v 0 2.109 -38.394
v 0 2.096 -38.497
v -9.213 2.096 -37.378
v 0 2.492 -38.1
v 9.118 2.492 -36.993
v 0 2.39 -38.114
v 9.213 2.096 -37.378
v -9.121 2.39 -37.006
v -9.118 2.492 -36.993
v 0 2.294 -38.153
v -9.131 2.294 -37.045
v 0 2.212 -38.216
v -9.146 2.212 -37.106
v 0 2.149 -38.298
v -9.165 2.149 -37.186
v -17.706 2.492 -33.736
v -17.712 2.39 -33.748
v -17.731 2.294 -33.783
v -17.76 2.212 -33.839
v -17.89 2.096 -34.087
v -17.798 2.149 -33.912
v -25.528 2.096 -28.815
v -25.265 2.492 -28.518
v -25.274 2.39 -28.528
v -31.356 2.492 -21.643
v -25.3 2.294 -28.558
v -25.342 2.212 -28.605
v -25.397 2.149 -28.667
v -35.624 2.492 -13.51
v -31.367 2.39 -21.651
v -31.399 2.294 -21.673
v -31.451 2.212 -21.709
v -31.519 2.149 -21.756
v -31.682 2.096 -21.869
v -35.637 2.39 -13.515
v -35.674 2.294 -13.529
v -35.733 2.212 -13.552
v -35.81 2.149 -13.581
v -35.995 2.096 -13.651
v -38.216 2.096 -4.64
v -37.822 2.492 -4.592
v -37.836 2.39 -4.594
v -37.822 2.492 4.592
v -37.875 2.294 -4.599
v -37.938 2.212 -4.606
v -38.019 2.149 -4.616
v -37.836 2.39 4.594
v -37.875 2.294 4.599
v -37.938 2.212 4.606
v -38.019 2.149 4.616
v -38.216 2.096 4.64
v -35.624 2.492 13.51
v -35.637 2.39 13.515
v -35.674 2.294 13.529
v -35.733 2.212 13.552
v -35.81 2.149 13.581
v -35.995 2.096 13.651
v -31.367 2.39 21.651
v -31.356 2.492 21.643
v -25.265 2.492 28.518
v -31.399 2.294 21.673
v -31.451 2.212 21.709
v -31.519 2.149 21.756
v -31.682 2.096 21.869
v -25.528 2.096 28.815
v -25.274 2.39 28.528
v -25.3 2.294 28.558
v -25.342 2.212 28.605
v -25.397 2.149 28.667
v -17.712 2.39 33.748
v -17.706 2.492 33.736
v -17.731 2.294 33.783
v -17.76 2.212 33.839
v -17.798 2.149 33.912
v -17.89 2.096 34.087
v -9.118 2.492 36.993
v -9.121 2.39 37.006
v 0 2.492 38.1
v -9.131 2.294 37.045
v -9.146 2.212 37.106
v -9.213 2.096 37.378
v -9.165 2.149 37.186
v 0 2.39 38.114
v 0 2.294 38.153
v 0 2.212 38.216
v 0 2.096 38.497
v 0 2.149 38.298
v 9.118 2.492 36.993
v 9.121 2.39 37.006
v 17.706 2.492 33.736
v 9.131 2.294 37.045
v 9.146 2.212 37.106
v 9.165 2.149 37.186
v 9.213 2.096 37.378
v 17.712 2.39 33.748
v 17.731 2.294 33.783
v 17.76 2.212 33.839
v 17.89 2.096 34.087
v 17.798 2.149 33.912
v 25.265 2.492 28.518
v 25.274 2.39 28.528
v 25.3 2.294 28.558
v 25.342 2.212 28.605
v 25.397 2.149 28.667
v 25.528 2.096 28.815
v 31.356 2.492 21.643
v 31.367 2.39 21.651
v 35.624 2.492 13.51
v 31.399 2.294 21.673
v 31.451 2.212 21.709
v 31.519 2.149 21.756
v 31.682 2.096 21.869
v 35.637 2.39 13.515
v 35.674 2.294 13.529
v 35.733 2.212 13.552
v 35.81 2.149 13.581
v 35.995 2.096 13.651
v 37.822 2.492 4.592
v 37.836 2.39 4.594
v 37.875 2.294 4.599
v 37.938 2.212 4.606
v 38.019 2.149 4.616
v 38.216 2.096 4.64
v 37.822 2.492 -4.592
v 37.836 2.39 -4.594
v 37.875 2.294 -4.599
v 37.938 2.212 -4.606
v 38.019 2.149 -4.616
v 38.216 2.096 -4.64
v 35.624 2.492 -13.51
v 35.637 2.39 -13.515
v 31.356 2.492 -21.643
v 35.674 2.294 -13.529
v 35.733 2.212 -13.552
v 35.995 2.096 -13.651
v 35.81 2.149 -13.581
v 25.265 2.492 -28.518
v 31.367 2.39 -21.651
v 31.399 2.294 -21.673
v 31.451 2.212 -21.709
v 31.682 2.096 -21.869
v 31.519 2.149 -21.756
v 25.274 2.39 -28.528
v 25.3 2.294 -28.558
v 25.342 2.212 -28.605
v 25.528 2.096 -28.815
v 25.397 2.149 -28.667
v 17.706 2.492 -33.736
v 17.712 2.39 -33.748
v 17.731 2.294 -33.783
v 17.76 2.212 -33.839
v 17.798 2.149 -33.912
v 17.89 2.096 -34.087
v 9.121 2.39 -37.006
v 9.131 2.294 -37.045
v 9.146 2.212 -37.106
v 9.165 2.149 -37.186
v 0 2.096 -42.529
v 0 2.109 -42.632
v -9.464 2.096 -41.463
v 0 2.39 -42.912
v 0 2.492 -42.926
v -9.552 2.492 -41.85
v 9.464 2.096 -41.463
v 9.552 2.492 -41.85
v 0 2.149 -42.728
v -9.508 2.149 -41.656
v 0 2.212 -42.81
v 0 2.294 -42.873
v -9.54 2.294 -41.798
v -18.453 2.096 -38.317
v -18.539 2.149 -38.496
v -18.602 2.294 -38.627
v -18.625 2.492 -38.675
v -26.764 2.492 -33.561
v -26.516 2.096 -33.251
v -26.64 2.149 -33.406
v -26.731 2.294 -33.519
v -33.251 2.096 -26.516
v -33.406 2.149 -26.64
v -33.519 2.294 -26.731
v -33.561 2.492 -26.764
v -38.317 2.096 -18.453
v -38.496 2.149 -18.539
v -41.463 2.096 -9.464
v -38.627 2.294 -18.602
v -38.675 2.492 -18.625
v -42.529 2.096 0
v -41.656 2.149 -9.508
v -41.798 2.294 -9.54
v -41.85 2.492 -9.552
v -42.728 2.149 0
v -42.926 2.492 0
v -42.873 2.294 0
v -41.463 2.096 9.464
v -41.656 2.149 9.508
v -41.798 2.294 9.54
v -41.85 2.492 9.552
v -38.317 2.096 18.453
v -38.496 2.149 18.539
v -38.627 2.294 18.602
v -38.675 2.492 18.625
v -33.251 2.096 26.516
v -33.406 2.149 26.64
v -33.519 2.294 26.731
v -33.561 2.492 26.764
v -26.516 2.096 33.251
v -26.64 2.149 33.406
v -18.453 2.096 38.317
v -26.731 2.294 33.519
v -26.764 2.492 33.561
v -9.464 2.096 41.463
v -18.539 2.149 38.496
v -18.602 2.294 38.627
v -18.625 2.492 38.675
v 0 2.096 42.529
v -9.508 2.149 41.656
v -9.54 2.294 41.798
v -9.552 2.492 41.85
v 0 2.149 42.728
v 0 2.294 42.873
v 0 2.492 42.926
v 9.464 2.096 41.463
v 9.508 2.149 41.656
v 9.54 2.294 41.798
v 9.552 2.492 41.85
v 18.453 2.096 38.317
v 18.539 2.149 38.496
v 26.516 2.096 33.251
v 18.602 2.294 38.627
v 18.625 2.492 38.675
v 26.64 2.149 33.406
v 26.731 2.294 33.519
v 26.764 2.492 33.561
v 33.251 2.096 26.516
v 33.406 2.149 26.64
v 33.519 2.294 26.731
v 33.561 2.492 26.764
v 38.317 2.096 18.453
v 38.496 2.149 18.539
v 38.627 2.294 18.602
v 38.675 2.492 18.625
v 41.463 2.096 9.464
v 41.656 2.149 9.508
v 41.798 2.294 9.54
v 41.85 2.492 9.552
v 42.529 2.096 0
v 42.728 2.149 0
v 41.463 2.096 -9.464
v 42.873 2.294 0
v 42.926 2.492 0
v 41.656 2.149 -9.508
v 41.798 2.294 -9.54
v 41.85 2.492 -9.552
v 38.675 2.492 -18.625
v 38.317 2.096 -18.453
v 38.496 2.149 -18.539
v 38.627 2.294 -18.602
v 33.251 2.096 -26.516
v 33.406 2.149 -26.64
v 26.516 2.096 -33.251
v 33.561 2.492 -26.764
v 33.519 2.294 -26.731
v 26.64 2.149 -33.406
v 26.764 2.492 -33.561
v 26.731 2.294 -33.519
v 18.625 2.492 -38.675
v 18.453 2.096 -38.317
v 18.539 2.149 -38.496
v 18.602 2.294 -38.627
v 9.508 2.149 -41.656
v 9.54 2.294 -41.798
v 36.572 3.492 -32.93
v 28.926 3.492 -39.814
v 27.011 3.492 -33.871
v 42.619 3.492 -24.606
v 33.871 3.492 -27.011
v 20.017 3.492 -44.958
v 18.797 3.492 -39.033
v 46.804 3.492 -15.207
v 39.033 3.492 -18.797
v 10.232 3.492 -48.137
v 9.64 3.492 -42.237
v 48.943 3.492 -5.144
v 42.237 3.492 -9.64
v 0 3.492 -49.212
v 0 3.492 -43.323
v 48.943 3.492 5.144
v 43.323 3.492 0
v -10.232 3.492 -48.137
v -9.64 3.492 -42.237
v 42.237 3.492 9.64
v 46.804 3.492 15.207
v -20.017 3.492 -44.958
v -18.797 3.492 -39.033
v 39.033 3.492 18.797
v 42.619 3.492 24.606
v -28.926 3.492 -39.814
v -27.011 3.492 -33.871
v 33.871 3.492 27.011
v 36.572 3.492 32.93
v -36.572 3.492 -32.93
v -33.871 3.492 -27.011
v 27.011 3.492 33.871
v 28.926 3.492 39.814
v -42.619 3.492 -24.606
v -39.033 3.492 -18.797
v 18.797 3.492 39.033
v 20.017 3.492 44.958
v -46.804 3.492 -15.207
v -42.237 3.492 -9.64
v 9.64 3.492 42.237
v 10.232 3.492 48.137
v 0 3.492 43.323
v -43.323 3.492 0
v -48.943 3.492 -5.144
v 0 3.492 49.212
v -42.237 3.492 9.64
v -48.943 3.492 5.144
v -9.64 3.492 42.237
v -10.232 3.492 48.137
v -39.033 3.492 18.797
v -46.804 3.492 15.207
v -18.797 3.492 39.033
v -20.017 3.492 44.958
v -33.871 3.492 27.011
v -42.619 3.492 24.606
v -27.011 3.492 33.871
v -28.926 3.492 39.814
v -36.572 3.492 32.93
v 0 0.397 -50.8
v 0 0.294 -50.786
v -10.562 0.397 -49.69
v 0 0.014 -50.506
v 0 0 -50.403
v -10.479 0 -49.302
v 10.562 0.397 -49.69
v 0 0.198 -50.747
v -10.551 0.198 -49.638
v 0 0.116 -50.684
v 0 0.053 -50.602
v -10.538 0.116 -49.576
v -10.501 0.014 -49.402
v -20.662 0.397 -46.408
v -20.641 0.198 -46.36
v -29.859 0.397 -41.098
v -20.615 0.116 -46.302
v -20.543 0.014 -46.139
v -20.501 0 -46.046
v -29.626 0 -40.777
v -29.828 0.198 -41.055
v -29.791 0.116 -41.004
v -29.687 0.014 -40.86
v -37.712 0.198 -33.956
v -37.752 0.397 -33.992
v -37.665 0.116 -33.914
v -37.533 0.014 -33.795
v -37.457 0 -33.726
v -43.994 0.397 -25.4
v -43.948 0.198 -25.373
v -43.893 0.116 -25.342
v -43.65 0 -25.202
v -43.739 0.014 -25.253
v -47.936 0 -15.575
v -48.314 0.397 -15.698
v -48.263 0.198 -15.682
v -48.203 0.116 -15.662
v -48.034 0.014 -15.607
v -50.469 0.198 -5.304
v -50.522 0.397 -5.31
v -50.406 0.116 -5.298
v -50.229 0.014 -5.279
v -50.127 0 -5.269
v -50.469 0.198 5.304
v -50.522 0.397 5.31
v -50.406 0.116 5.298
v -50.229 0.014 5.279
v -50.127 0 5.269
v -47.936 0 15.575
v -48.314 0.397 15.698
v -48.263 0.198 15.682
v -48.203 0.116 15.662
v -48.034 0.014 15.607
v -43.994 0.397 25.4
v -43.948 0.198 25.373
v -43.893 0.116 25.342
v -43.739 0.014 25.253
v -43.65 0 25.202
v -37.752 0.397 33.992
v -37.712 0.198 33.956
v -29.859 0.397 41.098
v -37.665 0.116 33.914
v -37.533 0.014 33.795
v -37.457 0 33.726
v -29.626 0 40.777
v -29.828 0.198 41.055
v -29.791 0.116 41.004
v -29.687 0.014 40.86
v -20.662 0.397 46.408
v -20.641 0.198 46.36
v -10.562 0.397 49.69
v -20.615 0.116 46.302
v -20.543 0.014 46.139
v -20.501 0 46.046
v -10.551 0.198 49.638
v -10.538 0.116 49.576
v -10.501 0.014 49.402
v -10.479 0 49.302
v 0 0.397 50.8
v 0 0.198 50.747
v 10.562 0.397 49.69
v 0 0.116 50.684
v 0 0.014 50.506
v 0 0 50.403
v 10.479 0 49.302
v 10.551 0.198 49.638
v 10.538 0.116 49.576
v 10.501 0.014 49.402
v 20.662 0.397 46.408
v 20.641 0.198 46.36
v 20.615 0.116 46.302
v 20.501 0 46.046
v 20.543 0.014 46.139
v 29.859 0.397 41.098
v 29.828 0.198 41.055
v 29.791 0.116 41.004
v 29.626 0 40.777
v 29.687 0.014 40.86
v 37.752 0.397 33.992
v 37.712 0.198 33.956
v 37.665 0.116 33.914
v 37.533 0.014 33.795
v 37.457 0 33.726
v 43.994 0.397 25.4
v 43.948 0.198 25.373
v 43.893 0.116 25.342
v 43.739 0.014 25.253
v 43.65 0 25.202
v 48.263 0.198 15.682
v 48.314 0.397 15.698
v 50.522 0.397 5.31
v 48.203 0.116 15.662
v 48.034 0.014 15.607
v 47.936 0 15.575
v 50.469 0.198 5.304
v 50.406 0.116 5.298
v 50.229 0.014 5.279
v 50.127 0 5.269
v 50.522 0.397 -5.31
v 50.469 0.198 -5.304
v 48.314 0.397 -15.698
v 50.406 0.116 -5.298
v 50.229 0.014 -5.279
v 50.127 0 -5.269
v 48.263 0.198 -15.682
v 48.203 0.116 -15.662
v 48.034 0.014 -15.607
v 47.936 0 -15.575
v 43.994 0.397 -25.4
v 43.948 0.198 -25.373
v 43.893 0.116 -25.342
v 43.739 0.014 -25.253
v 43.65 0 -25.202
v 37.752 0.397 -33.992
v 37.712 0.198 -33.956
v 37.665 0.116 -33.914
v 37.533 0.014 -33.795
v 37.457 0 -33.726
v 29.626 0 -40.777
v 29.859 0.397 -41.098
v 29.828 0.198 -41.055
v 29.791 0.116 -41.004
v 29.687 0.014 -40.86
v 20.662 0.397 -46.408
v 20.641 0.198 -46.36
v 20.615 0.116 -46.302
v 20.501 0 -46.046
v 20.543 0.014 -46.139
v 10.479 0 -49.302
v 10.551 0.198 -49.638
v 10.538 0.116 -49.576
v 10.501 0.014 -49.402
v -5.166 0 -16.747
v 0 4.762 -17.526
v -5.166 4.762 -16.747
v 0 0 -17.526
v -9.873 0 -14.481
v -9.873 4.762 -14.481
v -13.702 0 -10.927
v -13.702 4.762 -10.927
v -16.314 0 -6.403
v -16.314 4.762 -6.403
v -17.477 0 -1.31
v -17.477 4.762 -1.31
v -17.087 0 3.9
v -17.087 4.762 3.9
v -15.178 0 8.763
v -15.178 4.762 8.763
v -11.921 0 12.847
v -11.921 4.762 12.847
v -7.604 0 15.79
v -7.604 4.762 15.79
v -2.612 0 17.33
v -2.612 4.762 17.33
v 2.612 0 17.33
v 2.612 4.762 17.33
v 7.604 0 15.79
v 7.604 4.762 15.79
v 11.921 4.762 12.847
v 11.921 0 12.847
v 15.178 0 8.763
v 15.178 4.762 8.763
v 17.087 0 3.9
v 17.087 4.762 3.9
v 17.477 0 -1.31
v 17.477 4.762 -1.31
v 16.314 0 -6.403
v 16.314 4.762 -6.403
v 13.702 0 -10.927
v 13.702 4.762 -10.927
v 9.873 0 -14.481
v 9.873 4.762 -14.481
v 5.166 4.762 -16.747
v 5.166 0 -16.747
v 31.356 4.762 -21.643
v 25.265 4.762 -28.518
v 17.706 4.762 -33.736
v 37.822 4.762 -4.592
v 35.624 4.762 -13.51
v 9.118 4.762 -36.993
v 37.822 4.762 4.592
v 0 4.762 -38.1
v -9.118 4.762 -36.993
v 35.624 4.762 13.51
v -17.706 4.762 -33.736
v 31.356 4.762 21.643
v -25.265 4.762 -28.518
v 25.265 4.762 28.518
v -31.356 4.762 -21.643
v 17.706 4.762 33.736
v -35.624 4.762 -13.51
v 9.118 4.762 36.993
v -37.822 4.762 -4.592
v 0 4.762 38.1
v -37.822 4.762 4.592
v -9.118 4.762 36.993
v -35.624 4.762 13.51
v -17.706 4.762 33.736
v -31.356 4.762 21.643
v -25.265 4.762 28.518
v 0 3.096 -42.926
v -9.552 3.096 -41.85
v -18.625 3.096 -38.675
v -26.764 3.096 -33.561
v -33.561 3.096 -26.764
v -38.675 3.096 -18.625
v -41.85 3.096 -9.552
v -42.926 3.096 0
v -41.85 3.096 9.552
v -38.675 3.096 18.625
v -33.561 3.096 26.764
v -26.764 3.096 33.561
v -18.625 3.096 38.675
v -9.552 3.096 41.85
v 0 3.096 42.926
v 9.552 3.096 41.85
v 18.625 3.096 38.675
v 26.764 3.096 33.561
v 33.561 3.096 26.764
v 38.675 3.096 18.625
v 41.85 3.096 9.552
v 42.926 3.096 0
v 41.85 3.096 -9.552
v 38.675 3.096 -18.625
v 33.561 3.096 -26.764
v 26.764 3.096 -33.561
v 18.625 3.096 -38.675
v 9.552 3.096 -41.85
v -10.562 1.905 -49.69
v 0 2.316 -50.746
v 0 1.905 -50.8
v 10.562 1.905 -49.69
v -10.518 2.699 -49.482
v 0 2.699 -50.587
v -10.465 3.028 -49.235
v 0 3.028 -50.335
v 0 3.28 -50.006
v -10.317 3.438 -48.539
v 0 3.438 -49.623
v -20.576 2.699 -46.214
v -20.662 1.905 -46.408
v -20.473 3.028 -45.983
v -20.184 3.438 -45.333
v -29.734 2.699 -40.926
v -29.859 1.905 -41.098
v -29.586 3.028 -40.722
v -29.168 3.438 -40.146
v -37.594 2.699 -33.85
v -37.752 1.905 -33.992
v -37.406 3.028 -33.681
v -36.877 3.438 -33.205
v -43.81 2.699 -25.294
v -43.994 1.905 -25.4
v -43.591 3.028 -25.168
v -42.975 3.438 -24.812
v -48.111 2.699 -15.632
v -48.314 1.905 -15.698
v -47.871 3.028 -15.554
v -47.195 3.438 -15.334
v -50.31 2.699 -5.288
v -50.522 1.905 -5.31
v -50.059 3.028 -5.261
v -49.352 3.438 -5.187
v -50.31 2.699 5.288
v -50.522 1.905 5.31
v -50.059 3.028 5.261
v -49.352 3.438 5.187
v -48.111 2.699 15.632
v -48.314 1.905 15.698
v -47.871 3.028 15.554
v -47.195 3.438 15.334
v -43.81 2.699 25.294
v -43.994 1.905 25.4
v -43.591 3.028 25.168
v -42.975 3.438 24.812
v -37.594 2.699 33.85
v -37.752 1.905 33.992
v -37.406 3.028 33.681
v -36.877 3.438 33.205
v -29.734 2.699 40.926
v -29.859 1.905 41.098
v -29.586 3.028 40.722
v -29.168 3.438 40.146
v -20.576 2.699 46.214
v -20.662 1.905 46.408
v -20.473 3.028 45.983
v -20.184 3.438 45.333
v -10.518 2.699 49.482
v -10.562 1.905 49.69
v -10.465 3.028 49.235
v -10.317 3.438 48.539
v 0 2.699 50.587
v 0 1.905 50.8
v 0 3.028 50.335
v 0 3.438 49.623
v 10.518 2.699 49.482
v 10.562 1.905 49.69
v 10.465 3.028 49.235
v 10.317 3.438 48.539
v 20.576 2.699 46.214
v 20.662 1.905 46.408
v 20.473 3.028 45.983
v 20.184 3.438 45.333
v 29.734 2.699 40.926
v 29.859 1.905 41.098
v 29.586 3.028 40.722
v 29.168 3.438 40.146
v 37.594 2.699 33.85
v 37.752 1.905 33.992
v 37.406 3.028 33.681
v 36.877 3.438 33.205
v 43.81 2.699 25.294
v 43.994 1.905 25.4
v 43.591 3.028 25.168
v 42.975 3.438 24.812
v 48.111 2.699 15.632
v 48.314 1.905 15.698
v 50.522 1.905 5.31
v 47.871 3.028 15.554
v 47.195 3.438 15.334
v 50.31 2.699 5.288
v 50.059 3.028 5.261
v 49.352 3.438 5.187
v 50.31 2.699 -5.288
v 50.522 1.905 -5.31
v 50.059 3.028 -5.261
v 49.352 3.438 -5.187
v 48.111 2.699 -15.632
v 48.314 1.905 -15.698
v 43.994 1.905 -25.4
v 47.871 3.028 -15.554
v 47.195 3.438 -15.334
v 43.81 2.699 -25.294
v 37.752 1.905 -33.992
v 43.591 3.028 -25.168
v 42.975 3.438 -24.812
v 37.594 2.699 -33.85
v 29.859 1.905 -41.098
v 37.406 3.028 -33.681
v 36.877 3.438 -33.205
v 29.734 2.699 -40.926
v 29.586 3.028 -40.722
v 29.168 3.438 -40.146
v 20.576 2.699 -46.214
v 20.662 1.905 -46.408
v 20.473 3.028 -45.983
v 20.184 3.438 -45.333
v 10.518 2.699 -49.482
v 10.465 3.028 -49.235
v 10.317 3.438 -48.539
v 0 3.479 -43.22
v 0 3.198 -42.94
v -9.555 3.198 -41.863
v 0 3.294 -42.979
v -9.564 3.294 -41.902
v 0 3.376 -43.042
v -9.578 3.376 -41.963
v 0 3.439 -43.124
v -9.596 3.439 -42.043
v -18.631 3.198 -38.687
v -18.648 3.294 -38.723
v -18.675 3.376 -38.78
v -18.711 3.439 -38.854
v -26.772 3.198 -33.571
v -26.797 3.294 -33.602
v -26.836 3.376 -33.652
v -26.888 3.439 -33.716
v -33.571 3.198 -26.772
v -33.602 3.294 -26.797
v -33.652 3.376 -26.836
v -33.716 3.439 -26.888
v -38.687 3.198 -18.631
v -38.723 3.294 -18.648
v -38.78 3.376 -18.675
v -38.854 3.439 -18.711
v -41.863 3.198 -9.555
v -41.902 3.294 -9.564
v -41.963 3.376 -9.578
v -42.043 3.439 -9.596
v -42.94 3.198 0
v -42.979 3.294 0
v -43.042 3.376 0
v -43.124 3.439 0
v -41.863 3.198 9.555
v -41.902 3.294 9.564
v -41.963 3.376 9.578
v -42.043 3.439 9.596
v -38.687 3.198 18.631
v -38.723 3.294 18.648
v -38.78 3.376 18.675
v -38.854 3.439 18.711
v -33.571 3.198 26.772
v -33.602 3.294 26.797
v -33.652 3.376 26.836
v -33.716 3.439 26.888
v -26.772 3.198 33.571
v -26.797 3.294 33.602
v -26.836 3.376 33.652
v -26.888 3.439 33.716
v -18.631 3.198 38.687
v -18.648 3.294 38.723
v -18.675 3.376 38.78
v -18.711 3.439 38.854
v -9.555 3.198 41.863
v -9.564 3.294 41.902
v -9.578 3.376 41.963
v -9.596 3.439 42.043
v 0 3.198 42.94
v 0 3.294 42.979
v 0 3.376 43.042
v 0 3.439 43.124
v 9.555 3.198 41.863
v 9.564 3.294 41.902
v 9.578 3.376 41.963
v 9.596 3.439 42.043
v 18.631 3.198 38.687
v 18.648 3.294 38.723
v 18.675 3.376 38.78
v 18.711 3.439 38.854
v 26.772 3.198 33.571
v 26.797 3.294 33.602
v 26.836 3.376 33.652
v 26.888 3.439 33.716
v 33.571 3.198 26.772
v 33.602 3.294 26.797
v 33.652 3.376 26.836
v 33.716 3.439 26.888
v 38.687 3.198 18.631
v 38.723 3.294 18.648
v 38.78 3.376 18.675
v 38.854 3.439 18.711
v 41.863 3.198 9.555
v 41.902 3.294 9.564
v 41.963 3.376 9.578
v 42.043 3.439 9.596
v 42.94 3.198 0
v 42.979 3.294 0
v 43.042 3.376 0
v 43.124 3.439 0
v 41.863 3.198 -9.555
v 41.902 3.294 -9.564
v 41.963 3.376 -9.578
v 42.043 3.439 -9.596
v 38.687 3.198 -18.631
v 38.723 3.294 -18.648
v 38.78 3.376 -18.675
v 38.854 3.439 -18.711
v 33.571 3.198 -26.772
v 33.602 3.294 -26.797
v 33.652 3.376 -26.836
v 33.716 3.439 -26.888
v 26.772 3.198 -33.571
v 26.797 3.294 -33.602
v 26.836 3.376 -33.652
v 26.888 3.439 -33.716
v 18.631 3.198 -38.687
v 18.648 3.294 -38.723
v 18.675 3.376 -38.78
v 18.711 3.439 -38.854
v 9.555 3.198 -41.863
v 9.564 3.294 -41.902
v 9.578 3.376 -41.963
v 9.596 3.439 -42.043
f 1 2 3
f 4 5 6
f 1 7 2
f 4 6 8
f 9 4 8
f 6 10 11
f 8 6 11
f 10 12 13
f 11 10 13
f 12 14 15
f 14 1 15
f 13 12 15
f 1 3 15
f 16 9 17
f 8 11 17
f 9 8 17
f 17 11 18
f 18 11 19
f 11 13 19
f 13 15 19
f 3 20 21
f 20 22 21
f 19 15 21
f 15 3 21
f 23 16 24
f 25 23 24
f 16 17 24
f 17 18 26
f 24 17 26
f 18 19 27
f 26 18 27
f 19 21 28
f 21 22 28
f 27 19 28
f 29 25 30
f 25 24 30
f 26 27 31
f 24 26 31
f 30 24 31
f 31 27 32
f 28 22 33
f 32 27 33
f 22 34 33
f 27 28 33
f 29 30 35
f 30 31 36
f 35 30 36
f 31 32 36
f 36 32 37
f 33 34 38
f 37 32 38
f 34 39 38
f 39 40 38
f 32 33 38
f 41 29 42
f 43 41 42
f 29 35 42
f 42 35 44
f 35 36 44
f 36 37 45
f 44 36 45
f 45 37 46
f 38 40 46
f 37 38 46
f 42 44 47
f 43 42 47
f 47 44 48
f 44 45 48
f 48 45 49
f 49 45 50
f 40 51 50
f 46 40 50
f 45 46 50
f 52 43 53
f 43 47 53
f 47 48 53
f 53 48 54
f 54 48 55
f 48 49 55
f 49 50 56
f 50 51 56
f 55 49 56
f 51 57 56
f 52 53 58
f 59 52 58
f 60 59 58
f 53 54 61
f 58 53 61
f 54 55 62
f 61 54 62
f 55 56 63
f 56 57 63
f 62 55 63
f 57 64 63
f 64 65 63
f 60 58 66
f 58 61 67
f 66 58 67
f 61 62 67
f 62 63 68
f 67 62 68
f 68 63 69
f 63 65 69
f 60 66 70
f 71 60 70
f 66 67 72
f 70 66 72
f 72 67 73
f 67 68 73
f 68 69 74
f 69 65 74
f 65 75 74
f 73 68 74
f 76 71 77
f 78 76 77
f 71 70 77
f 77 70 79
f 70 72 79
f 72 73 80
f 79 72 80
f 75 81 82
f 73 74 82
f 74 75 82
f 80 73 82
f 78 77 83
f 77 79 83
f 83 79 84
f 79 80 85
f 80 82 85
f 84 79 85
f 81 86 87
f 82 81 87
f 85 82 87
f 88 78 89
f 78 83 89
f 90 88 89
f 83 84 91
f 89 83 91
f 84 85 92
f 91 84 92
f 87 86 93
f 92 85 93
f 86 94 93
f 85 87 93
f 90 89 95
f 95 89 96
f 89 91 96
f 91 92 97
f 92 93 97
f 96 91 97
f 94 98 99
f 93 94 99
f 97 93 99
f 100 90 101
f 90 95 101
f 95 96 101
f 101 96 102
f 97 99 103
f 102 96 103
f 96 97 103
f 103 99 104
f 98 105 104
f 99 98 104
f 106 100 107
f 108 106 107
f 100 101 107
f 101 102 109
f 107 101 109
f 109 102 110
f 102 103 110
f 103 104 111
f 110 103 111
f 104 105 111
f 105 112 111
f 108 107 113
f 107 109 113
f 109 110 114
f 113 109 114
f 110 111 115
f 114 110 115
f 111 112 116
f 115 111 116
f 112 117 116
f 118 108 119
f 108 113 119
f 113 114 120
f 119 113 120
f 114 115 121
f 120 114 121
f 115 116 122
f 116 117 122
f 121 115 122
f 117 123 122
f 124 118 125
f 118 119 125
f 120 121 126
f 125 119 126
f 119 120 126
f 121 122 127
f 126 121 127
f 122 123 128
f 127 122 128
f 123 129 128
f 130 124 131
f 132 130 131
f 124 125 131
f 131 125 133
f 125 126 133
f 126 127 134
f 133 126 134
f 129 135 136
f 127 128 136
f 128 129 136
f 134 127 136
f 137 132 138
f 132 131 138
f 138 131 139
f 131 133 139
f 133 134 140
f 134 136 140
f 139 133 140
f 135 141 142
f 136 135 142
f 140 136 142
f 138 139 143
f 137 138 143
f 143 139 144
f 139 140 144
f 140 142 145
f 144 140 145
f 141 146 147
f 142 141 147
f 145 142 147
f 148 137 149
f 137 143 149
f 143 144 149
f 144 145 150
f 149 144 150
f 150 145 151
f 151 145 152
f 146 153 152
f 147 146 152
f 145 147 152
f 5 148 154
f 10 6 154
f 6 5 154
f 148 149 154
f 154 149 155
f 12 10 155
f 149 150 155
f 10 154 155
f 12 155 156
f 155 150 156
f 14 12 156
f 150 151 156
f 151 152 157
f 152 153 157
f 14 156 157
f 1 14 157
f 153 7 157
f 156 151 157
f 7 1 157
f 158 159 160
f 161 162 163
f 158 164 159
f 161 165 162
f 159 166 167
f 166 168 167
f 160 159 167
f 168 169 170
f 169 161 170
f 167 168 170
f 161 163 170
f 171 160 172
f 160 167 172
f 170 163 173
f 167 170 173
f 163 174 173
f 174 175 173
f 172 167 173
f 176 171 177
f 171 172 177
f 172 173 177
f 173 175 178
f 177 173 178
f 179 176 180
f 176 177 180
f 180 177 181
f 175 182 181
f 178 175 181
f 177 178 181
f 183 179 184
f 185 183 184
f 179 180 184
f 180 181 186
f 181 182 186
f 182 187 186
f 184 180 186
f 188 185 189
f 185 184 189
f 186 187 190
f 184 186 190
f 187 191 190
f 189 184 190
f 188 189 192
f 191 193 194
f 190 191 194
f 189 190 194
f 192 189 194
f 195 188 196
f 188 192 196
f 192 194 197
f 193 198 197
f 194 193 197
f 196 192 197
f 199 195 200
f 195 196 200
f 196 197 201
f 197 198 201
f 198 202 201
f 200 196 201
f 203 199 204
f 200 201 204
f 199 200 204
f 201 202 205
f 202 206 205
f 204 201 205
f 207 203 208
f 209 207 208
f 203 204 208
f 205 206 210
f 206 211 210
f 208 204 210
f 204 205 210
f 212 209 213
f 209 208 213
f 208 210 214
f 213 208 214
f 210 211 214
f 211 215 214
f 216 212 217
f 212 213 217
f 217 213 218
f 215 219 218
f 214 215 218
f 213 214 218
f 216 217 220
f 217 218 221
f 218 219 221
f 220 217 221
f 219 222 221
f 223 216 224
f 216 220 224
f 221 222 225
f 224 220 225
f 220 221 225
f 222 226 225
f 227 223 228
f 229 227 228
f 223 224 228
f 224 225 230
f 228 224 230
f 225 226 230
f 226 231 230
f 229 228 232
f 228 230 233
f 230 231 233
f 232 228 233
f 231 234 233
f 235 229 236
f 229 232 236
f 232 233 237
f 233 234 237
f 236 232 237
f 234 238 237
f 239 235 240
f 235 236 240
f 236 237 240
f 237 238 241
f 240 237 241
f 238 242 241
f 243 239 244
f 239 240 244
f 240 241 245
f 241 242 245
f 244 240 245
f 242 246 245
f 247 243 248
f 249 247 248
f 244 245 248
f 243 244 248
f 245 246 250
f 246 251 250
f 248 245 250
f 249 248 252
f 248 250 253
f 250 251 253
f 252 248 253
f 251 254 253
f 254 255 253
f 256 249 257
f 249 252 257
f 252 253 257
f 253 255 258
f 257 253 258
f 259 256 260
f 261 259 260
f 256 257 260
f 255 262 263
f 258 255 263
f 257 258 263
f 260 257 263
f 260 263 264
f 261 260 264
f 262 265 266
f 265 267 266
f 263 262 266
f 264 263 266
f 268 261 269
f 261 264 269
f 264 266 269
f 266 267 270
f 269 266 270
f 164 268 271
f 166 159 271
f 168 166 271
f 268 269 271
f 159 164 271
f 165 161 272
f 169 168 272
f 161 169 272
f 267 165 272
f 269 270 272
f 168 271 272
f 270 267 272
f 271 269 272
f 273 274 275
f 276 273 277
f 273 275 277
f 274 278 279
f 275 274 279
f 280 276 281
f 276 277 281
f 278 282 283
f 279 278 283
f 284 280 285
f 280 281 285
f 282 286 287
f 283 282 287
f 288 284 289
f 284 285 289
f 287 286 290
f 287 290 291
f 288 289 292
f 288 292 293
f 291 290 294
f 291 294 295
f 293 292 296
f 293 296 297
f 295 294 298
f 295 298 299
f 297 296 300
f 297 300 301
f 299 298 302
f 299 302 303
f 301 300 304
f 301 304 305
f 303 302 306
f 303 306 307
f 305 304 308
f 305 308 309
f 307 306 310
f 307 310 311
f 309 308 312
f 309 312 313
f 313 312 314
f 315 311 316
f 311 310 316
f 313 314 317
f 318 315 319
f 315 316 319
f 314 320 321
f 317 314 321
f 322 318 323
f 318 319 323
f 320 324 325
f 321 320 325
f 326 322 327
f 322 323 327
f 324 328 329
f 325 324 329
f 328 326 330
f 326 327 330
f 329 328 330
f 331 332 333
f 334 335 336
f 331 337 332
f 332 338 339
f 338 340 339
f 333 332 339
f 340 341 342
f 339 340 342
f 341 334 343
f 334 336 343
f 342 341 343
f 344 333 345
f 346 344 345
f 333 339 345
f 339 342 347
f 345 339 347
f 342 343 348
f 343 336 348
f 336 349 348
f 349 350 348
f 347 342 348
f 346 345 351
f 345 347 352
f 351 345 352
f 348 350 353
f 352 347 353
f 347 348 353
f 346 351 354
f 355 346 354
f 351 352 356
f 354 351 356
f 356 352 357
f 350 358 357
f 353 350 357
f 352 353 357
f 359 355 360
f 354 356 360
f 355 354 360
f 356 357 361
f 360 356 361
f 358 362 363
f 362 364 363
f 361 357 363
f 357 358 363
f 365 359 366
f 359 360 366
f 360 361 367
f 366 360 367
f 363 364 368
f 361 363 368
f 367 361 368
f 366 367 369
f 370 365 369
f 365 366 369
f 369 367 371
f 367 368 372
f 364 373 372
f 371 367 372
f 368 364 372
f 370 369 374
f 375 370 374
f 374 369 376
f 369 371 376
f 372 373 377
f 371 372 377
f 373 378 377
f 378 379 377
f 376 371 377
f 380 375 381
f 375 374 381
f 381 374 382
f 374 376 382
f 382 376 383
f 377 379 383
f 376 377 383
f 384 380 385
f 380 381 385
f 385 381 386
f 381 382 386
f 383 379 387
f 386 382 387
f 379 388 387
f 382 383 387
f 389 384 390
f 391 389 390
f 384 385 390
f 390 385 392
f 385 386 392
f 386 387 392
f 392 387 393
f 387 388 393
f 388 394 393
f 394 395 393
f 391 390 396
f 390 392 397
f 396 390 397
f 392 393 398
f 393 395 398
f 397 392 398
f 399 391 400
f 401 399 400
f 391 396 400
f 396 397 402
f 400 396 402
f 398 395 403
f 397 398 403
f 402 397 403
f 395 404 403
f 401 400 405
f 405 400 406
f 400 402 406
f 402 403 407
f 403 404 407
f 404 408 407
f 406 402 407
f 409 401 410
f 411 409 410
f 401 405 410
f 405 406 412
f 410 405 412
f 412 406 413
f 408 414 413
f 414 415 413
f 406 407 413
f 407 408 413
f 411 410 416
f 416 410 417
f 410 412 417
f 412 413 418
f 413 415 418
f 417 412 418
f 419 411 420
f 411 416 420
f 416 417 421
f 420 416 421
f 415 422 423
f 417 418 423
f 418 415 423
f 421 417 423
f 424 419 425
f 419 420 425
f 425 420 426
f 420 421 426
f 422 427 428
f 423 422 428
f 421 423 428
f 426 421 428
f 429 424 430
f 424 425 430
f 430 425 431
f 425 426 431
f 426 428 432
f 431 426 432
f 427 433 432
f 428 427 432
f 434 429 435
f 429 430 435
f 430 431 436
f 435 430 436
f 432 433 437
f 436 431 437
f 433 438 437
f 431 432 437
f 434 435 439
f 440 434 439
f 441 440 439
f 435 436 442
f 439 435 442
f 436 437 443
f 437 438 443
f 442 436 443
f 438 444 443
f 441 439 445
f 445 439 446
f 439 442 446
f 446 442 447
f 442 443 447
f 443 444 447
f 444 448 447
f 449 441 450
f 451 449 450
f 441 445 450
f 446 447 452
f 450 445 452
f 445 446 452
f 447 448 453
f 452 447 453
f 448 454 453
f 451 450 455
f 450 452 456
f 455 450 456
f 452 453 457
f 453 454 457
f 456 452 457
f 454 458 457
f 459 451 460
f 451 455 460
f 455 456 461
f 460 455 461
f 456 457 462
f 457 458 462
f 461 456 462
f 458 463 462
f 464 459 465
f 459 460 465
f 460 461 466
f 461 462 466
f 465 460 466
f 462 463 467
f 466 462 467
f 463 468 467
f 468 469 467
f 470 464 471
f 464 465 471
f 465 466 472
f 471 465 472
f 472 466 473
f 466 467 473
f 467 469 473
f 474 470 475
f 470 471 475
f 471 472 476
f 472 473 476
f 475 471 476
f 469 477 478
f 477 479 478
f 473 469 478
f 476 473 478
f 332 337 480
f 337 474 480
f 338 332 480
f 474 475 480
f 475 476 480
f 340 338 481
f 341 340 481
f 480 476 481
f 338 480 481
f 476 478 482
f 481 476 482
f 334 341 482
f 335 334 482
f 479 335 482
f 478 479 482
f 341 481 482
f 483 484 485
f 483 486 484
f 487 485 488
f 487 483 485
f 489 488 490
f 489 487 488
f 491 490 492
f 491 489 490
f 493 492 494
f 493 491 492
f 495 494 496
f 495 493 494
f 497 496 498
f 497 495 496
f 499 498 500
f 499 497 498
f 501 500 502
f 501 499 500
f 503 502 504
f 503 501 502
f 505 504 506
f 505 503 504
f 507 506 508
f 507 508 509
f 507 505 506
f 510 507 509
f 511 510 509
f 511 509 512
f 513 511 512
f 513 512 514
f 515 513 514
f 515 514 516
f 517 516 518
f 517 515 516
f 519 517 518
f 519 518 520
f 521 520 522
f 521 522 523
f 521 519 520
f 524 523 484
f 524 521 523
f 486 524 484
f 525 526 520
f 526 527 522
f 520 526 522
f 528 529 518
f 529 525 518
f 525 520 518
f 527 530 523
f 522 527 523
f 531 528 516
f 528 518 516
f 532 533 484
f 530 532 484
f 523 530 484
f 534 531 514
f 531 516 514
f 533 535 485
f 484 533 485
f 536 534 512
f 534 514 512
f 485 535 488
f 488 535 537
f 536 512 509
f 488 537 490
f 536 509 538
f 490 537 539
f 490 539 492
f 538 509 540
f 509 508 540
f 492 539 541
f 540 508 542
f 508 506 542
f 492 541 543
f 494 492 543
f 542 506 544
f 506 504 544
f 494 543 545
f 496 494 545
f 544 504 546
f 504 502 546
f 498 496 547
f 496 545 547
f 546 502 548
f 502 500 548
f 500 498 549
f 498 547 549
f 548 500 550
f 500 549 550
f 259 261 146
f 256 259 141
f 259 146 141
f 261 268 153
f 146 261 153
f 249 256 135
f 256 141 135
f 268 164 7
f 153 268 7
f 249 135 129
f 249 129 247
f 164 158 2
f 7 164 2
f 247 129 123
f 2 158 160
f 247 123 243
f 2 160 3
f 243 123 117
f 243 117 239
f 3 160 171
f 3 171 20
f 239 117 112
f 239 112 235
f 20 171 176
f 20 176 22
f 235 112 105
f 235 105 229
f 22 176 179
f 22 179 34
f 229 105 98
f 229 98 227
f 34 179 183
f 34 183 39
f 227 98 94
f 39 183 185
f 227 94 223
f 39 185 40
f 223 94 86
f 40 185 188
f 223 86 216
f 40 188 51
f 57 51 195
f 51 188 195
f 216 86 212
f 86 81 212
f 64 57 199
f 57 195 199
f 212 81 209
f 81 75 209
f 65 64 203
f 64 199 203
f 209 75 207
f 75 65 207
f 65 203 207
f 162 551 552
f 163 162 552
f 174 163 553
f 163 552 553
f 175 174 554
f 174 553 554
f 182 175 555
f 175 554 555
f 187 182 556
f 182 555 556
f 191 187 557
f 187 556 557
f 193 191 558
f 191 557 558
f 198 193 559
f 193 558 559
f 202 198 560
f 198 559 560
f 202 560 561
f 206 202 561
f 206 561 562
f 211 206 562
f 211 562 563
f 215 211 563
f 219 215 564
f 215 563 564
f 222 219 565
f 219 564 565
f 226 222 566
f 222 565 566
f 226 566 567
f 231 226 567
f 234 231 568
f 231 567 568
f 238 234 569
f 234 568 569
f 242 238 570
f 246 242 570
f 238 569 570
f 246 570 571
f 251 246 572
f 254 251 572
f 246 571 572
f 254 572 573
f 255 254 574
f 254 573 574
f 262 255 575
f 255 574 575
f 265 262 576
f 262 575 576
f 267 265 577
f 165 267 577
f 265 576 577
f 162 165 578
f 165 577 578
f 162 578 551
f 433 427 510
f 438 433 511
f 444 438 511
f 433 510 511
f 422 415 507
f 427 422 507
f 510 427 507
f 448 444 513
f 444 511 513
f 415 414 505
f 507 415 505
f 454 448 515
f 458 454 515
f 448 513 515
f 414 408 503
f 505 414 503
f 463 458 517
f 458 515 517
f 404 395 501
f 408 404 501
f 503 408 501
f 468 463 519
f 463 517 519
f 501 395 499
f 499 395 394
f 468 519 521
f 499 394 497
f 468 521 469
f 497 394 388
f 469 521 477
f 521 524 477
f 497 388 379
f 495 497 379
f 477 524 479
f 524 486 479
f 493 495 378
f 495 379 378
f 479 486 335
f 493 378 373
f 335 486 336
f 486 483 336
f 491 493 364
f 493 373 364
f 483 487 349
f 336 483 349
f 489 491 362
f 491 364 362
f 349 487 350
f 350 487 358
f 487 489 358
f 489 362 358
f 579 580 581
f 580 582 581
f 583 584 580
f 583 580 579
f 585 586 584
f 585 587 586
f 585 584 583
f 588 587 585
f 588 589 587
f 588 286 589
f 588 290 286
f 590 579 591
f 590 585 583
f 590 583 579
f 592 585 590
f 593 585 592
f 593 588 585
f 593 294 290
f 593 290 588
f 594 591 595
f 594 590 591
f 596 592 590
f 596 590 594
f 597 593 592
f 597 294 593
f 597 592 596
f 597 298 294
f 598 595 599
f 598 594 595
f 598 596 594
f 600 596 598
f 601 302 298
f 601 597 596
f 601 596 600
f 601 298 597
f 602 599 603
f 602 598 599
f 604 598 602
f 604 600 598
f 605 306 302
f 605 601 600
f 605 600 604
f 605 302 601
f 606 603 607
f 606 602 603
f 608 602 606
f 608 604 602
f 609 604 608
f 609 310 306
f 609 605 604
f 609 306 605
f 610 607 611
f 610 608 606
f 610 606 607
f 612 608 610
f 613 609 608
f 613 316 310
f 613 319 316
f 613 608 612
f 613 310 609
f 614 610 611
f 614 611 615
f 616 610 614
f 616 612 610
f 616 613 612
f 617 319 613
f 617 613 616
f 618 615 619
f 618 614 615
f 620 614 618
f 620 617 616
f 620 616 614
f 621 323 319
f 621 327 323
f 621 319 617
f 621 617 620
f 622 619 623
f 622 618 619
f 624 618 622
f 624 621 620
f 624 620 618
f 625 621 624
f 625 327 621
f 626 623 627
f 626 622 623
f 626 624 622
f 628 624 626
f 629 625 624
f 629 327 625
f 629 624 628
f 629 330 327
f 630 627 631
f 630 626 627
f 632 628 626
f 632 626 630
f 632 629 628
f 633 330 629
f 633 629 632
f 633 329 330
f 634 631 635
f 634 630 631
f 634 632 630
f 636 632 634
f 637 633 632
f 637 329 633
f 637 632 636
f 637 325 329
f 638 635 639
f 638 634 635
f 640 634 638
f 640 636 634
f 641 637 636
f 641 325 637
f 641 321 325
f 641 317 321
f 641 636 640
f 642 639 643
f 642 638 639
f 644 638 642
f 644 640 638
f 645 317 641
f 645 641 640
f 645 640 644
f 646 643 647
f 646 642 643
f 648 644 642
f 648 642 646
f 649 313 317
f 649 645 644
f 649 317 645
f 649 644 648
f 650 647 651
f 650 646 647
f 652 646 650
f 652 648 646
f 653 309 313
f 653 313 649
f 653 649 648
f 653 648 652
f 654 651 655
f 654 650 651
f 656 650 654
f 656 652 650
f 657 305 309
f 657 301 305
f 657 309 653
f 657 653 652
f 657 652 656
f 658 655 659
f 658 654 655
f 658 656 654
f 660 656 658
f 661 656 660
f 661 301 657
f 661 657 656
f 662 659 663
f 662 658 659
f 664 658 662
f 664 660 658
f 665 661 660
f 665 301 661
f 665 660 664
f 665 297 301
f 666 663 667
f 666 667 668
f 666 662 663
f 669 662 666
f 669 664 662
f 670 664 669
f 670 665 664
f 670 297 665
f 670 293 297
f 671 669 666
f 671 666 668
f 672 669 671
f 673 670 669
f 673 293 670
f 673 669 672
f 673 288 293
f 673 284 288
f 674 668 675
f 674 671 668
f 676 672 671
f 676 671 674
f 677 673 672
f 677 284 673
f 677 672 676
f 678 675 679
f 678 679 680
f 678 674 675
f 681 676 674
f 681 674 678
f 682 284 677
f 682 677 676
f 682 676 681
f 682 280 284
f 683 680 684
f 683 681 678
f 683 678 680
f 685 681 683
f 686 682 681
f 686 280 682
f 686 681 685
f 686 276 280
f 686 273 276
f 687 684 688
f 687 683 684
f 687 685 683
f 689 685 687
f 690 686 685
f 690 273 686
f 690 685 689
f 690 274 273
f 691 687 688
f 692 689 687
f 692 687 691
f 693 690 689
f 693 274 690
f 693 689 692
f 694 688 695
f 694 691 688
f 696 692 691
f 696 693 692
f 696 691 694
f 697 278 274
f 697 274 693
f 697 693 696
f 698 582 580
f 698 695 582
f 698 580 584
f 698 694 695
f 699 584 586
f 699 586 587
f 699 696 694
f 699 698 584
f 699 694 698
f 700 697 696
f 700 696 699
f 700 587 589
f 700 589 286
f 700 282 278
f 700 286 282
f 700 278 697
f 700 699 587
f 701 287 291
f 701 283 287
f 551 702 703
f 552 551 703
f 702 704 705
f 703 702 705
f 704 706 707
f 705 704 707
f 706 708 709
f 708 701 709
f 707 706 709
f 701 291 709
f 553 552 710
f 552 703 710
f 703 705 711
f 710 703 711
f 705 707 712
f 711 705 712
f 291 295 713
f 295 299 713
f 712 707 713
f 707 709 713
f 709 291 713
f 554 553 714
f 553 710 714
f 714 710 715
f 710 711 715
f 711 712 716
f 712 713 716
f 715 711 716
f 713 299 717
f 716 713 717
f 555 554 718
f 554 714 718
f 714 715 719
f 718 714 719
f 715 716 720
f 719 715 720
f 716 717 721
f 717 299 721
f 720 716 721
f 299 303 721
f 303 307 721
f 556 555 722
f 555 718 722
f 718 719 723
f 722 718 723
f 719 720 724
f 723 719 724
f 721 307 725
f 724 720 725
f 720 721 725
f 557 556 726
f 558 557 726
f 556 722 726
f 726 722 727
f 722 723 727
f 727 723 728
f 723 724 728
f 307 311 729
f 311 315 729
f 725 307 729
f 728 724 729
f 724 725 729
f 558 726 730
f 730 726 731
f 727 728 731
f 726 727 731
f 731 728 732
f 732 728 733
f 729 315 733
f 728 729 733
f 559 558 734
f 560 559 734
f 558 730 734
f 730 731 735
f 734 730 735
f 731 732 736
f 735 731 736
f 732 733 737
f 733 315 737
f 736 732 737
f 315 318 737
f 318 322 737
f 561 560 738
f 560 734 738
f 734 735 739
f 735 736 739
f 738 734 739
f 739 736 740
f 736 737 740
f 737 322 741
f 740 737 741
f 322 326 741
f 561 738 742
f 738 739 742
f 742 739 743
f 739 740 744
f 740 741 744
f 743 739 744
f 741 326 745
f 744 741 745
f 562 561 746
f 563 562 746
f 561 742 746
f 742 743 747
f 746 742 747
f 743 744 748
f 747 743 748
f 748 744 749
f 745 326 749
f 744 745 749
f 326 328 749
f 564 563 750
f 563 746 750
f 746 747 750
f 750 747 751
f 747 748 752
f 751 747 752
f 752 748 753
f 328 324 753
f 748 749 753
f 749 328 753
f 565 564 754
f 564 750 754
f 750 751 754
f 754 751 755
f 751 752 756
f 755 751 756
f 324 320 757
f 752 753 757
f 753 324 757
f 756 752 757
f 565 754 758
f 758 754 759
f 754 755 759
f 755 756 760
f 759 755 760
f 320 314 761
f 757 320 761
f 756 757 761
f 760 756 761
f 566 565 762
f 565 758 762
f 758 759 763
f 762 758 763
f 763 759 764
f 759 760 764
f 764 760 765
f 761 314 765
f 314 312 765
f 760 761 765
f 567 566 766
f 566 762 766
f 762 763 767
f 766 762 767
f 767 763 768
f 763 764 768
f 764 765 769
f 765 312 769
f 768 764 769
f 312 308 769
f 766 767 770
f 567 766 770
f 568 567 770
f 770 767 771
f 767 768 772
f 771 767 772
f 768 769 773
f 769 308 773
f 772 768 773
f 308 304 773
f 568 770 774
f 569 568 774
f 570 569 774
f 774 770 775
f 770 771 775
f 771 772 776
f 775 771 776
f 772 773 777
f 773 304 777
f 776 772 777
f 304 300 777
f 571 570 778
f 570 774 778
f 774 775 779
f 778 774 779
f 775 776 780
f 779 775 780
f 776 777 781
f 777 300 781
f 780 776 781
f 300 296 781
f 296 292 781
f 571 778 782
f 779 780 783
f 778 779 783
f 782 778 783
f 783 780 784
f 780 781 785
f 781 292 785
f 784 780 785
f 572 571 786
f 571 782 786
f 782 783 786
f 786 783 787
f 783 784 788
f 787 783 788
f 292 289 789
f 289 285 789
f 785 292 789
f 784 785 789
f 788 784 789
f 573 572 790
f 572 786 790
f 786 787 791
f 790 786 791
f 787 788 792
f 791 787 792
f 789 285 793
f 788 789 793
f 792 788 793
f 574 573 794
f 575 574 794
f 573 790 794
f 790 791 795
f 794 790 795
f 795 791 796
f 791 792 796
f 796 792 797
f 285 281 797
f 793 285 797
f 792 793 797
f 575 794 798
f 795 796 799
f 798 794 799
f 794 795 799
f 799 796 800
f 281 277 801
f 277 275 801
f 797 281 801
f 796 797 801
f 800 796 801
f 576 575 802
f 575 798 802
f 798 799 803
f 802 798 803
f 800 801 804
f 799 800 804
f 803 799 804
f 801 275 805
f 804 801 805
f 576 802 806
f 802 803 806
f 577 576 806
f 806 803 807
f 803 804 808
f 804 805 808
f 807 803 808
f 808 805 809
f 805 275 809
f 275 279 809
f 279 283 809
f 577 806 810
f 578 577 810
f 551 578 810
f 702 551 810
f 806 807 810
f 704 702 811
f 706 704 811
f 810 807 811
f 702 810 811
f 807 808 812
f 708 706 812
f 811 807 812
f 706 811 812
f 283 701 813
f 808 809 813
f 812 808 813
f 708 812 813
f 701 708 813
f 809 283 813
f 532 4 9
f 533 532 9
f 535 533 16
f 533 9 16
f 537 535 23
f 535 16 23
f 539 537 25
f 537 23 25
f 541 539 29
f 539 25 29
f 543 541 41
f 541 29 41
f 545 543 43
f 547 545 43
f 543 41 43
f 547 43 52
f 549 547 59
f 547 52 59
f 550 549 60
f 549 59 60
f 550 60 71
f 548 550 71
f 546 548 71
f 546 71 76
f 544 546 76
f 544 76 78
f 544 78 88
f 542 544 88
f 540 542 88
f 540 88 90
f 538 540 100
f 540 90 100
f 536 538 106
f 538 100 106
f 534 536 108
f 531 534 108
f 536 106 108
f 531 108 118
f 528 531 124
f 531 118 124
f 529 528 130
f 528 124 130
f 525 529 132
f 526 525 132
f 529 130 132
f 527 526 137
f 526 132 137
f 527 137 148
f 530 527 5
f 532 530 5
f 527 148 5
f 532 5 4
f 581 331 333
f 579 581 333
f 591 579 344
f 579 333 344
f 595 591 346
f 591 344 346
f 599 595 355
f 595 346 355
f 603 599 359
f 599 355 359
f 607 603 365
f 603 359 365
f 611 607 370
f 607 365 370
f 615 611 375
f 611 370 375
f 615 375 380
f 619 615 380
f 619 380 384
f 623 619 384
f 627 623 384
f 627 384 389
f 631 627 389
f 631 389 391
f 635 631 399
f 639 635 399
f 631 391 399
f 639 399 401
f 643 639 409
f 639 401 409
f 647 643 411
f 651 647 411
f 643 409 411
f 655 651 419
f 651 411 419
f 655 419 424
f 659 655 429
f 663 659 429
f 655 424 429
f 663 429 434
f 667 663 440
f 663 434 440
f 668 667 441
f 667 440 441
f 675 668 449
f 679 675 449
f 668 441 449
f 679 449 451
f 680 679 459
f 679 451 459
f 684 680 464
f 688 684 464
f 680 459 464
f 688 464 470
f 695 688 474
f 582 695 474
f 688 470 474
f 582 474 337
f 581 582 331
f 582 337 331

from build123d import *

# Parameters (mm, degrees)
FILLET1_R = 0.396875
FILLET2_R = 1.5875


with BuildPart() as part:
    # Sketch1 → Revolve1 (revolve)
    with BuildSketch(Plane.XY, mode=Mode.PRIVATE) as revolve1_sk:
        Polygon((17.526, 0), (17.526, 2.0955), (17.526, 4.7625), (38.1, 4.7625), (38.1, 2.0955), (42.926, 2.0955), (42.926, 3.4925), (50.8, 3.4925), (50.8, 0), align=None)
    revolve(revolve1_sk.sketch.rotate(Axis((0, 0, 0), (0, 1, 0)), 90), axis=Axis((0, 0, 0), (0, 1, 0)))

    # Fillet1
    fillet1_edges = [part.edges().sort_by_distance(p)[0] for p in [
        (0, 0, 50.8),
        (0, 3.4925, 42.926),
        (0, 2.0955, 42.926),
        (0, 2.0955, 38.1),
    ]]
    fillet(fillet1_edges, radius=FILLET1_R)

    # Fillet2
    fillet2_edges = [part.edges().sort_by_distance(p)[0] for p in [
        (0, 3.4925, 50.8),
    ]]
    fillet(fillet2_edges, radius=FILLET2_R)


solid = part.part
